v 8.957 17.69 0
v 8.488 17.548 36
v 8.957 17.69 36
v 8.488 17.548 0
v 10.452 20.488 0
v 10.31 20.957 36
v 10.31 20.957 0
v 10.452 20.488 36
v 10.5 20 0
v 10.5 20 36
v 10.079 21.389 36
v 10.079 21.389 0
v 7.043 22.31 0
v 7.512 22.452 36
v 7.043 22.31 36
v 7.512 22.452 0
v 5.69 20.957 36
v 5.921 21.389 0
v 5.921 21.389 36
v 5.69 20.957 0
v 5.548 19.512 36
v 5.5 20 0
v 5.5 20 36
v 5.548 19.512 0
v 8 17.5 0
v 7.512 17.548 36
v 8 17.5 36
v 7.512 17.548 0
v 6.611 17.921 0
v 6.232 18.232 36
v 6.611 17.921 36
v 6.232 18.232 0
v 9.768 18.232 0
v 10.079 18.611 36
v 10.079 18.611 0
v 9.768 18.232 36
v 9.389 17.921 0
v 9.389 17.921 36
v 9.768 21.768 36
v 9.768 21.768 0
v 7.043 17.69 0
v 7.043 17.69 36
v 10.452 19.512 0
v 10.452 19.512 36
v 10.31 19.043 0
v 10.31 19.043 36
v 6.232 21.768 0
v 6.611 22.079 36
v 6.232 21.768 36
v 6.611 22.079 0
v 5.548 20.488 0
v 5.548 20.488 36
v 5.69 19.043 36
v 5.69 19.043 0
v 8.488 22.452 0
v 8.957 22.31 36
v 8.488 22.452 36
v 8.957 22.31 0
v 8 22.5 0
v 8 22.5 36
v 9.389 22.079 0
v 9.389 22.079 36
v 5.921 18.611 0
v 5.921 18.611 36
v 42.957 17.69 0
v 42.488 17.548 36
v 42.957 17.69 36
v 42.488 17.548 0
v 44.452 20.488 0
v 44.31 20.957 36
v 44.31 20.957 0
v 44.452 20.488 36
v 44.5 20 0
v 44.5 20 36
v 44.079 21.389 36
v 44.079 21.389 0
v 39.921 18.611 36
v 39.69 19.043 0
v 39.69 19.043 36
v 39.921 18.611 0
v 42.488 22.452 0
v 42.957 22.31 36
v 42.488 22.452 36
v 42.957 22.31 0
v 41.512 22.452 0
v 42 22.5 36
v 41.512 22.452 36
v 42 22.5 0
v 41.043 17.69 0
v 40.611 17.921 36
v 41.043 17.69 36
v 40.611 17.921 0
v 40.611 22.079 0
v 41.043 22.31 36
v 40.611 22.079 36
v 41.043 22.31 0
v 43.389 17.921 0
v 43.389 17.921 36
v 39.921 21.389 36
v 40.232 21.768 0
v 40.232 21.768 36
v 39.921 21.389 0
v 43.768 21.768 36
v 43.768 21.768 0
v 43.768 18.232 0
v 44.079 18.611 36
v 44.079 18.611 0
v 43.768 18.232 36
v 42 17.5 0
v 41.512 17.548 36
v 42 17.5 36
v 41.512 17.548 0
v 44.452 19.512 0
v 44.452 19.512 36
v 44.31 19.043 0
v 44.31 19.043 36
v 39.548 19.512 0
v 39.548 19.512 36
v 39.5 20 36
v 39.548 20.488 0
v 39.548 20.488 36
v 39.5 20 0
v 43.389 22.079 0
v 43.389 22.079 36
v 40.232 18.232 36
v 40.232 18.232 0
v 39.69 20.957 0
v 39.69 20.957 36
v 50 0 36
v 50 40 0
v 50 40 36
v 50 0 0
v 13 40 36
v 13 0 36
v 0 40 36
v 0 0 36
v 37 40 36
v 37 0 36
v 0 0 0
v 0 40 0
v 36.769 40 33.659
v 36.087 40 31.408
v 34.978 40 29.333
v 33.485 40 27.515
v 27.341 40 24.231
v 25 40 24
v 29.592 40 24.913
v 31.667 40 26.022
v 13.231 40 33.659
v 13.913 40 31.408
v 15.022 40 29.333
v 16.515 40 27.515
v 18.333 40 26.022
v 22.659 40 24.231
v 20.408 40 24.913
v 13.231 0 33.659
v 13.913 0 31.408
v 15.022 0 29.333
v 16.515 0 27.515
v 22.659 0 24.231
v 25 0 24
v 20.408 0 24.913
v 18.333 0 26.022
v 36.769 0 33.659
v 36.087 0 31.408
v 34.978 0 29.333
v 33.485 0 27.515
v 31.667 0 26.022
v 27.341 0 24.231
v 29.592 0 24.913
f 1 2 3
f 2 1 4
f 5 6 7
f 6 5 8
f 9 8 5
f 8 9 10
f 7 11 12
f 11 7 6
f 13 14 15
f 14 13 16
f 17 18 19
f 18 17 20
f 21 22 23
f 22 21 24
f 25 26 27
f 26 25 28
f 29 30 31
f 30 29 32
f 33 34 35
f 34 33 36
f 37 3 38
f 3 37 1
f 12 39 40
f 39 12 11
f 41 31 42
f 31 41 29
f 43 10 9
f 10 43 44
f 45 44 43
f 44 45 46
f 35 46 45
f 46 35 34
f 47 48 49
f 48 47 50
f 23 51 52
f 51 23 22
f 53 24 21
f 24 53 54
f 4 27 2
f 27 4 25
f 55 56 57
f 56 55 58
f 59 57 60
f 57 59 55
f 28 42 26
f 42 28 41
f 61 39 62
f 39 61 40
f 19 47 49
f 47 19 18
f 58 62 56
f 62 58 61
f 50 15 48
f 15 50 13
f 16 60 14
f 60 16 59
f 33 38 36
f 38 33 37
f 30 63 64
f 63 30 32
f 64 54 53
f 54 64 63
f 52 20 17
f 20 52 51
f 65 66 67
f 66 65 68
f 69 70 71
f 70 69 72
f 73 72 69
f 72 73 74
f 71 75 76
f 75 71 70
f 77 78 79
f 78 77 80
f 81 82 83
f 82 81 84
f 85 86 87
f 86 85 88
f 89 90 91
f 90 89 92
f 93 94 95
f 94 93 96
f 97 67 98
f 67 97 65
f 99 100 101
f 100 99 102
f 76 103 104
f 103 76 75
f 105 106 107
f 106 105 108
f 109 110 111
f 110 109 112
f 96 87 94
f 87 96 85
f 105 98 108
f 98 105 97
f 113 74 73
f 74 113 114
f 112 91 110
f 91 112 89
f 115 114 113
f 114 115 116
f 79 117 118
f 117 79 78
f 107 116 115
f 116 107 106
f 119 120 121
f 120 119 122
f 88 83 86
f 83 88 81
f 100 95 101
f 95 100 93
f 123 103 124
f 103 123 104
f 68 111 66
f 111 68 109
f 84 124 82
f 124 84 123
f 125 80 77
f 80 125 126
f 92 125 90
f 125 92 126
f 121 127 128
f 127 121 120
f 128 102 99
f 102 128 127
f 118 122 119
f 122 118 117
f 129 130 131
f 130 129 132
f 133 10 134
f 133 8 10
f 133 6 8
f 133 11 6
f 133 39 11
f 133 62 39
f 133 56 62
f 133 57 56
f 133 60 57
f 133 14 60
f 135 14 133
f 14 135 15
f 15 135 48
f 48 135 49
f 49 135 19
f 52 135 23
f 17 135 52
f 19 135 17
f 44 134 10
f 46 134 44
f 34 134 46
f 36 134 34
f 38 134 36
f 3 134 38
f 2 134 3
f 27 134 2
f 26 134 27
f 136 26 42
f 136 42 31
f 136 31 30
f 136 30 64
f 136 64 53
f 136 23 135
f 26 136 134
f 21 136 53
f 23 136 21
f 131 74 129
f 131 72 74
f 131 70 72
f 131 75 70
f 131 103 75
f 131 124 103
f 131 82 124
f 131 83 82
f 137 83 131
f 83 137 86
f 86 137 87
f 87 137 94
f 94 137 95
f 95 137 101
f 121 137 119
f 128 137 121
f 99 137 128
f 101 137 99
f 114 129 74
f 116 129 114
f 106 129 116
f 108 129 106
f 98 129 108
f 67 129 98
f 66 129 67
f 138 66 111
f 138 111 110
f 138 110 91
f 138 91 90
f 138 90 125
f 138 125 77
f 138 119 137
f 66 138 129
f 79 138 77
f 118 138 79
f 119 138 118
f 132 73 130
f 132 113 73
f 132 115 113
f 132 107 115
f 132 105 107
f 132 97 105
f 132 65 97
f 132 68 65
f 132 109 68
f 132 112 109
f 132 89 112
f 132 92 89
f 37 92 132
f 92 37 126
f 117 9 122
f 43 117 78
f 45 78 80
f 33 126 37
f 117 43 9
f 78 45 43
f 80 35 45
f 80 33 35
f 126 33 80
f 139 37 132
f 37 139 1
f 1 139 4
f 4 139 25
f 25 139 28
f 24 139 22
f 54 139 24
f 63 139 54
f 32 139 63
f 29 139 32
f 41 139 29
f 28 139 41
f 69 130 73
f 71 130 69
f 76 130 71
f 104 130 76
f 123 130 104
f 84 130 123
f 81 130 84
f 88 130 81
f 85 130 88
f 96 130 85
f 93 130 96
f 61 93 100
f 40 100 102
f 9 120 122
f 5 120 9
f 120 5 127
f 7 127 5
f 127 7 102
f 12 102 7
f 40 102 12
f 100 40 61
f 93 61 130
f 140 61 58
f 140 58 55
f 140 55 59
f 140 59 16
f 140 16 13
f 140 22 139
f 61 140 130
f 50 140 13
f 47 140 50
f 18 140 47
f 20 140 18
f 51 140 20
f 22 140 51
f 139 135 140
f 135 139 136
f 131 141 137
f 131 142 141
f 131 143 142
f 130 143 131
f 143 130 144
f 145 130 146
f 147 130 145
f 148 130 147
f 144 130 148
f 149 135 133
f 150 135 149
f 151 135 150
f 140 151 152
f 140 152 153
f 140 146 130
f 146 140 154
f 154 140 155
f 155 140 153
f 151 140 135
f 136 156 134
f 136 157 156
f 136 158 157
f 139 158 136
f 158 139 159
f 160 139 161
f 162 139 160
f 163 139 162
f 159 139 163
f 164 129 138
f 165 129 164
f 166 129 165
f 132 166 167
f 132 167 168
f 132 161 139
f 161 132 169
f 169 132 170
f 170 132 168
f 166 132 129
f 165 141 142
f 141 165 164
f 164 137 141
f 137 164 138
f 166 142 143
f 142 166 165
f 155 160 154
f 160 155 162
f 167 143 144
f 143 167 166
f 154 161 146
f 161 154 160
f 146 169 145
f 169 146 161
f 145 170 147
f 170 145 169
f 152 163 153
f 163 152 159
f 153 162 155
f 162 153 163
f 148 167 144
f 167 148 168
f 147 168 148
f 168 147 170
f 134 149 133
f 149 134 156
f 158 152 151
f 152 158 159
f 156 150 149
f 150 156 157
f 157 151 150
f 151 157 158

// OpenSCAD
$fn = 32;

// ----------------------------------------------------------------------
// Saddle clamp: plain shaft clamp
// ----------------------------------------------------------------------

// --- parameters (mm) ---
blk_l = 50;               // block length, X
blk_w = 40;               // block width, Y
blk_h = 36;               // block height
clamp_r = 12;             // shaft groove radius
hole_r = 2.5;             // bolt hole radius
hole_m = 8;               // bolt hole margin from the ends

saw_depth = clamp_r + 3;  // saw kerf depth

difference() {
  cube([blk_l, blk_w, blk_h]);
  translate([blk_l / 2, -1, blk_h])
    rotate([-90, 0, 0])
      cylinder(h = blk_w + 2, r = clamp_r);
  for (sx = [0, 1])
    translate([sx ? blk_l - hole_m : hole_m, blk_w / 2, -1])
      cylinder(r = hole_r, h = blk_h + 2);
}
